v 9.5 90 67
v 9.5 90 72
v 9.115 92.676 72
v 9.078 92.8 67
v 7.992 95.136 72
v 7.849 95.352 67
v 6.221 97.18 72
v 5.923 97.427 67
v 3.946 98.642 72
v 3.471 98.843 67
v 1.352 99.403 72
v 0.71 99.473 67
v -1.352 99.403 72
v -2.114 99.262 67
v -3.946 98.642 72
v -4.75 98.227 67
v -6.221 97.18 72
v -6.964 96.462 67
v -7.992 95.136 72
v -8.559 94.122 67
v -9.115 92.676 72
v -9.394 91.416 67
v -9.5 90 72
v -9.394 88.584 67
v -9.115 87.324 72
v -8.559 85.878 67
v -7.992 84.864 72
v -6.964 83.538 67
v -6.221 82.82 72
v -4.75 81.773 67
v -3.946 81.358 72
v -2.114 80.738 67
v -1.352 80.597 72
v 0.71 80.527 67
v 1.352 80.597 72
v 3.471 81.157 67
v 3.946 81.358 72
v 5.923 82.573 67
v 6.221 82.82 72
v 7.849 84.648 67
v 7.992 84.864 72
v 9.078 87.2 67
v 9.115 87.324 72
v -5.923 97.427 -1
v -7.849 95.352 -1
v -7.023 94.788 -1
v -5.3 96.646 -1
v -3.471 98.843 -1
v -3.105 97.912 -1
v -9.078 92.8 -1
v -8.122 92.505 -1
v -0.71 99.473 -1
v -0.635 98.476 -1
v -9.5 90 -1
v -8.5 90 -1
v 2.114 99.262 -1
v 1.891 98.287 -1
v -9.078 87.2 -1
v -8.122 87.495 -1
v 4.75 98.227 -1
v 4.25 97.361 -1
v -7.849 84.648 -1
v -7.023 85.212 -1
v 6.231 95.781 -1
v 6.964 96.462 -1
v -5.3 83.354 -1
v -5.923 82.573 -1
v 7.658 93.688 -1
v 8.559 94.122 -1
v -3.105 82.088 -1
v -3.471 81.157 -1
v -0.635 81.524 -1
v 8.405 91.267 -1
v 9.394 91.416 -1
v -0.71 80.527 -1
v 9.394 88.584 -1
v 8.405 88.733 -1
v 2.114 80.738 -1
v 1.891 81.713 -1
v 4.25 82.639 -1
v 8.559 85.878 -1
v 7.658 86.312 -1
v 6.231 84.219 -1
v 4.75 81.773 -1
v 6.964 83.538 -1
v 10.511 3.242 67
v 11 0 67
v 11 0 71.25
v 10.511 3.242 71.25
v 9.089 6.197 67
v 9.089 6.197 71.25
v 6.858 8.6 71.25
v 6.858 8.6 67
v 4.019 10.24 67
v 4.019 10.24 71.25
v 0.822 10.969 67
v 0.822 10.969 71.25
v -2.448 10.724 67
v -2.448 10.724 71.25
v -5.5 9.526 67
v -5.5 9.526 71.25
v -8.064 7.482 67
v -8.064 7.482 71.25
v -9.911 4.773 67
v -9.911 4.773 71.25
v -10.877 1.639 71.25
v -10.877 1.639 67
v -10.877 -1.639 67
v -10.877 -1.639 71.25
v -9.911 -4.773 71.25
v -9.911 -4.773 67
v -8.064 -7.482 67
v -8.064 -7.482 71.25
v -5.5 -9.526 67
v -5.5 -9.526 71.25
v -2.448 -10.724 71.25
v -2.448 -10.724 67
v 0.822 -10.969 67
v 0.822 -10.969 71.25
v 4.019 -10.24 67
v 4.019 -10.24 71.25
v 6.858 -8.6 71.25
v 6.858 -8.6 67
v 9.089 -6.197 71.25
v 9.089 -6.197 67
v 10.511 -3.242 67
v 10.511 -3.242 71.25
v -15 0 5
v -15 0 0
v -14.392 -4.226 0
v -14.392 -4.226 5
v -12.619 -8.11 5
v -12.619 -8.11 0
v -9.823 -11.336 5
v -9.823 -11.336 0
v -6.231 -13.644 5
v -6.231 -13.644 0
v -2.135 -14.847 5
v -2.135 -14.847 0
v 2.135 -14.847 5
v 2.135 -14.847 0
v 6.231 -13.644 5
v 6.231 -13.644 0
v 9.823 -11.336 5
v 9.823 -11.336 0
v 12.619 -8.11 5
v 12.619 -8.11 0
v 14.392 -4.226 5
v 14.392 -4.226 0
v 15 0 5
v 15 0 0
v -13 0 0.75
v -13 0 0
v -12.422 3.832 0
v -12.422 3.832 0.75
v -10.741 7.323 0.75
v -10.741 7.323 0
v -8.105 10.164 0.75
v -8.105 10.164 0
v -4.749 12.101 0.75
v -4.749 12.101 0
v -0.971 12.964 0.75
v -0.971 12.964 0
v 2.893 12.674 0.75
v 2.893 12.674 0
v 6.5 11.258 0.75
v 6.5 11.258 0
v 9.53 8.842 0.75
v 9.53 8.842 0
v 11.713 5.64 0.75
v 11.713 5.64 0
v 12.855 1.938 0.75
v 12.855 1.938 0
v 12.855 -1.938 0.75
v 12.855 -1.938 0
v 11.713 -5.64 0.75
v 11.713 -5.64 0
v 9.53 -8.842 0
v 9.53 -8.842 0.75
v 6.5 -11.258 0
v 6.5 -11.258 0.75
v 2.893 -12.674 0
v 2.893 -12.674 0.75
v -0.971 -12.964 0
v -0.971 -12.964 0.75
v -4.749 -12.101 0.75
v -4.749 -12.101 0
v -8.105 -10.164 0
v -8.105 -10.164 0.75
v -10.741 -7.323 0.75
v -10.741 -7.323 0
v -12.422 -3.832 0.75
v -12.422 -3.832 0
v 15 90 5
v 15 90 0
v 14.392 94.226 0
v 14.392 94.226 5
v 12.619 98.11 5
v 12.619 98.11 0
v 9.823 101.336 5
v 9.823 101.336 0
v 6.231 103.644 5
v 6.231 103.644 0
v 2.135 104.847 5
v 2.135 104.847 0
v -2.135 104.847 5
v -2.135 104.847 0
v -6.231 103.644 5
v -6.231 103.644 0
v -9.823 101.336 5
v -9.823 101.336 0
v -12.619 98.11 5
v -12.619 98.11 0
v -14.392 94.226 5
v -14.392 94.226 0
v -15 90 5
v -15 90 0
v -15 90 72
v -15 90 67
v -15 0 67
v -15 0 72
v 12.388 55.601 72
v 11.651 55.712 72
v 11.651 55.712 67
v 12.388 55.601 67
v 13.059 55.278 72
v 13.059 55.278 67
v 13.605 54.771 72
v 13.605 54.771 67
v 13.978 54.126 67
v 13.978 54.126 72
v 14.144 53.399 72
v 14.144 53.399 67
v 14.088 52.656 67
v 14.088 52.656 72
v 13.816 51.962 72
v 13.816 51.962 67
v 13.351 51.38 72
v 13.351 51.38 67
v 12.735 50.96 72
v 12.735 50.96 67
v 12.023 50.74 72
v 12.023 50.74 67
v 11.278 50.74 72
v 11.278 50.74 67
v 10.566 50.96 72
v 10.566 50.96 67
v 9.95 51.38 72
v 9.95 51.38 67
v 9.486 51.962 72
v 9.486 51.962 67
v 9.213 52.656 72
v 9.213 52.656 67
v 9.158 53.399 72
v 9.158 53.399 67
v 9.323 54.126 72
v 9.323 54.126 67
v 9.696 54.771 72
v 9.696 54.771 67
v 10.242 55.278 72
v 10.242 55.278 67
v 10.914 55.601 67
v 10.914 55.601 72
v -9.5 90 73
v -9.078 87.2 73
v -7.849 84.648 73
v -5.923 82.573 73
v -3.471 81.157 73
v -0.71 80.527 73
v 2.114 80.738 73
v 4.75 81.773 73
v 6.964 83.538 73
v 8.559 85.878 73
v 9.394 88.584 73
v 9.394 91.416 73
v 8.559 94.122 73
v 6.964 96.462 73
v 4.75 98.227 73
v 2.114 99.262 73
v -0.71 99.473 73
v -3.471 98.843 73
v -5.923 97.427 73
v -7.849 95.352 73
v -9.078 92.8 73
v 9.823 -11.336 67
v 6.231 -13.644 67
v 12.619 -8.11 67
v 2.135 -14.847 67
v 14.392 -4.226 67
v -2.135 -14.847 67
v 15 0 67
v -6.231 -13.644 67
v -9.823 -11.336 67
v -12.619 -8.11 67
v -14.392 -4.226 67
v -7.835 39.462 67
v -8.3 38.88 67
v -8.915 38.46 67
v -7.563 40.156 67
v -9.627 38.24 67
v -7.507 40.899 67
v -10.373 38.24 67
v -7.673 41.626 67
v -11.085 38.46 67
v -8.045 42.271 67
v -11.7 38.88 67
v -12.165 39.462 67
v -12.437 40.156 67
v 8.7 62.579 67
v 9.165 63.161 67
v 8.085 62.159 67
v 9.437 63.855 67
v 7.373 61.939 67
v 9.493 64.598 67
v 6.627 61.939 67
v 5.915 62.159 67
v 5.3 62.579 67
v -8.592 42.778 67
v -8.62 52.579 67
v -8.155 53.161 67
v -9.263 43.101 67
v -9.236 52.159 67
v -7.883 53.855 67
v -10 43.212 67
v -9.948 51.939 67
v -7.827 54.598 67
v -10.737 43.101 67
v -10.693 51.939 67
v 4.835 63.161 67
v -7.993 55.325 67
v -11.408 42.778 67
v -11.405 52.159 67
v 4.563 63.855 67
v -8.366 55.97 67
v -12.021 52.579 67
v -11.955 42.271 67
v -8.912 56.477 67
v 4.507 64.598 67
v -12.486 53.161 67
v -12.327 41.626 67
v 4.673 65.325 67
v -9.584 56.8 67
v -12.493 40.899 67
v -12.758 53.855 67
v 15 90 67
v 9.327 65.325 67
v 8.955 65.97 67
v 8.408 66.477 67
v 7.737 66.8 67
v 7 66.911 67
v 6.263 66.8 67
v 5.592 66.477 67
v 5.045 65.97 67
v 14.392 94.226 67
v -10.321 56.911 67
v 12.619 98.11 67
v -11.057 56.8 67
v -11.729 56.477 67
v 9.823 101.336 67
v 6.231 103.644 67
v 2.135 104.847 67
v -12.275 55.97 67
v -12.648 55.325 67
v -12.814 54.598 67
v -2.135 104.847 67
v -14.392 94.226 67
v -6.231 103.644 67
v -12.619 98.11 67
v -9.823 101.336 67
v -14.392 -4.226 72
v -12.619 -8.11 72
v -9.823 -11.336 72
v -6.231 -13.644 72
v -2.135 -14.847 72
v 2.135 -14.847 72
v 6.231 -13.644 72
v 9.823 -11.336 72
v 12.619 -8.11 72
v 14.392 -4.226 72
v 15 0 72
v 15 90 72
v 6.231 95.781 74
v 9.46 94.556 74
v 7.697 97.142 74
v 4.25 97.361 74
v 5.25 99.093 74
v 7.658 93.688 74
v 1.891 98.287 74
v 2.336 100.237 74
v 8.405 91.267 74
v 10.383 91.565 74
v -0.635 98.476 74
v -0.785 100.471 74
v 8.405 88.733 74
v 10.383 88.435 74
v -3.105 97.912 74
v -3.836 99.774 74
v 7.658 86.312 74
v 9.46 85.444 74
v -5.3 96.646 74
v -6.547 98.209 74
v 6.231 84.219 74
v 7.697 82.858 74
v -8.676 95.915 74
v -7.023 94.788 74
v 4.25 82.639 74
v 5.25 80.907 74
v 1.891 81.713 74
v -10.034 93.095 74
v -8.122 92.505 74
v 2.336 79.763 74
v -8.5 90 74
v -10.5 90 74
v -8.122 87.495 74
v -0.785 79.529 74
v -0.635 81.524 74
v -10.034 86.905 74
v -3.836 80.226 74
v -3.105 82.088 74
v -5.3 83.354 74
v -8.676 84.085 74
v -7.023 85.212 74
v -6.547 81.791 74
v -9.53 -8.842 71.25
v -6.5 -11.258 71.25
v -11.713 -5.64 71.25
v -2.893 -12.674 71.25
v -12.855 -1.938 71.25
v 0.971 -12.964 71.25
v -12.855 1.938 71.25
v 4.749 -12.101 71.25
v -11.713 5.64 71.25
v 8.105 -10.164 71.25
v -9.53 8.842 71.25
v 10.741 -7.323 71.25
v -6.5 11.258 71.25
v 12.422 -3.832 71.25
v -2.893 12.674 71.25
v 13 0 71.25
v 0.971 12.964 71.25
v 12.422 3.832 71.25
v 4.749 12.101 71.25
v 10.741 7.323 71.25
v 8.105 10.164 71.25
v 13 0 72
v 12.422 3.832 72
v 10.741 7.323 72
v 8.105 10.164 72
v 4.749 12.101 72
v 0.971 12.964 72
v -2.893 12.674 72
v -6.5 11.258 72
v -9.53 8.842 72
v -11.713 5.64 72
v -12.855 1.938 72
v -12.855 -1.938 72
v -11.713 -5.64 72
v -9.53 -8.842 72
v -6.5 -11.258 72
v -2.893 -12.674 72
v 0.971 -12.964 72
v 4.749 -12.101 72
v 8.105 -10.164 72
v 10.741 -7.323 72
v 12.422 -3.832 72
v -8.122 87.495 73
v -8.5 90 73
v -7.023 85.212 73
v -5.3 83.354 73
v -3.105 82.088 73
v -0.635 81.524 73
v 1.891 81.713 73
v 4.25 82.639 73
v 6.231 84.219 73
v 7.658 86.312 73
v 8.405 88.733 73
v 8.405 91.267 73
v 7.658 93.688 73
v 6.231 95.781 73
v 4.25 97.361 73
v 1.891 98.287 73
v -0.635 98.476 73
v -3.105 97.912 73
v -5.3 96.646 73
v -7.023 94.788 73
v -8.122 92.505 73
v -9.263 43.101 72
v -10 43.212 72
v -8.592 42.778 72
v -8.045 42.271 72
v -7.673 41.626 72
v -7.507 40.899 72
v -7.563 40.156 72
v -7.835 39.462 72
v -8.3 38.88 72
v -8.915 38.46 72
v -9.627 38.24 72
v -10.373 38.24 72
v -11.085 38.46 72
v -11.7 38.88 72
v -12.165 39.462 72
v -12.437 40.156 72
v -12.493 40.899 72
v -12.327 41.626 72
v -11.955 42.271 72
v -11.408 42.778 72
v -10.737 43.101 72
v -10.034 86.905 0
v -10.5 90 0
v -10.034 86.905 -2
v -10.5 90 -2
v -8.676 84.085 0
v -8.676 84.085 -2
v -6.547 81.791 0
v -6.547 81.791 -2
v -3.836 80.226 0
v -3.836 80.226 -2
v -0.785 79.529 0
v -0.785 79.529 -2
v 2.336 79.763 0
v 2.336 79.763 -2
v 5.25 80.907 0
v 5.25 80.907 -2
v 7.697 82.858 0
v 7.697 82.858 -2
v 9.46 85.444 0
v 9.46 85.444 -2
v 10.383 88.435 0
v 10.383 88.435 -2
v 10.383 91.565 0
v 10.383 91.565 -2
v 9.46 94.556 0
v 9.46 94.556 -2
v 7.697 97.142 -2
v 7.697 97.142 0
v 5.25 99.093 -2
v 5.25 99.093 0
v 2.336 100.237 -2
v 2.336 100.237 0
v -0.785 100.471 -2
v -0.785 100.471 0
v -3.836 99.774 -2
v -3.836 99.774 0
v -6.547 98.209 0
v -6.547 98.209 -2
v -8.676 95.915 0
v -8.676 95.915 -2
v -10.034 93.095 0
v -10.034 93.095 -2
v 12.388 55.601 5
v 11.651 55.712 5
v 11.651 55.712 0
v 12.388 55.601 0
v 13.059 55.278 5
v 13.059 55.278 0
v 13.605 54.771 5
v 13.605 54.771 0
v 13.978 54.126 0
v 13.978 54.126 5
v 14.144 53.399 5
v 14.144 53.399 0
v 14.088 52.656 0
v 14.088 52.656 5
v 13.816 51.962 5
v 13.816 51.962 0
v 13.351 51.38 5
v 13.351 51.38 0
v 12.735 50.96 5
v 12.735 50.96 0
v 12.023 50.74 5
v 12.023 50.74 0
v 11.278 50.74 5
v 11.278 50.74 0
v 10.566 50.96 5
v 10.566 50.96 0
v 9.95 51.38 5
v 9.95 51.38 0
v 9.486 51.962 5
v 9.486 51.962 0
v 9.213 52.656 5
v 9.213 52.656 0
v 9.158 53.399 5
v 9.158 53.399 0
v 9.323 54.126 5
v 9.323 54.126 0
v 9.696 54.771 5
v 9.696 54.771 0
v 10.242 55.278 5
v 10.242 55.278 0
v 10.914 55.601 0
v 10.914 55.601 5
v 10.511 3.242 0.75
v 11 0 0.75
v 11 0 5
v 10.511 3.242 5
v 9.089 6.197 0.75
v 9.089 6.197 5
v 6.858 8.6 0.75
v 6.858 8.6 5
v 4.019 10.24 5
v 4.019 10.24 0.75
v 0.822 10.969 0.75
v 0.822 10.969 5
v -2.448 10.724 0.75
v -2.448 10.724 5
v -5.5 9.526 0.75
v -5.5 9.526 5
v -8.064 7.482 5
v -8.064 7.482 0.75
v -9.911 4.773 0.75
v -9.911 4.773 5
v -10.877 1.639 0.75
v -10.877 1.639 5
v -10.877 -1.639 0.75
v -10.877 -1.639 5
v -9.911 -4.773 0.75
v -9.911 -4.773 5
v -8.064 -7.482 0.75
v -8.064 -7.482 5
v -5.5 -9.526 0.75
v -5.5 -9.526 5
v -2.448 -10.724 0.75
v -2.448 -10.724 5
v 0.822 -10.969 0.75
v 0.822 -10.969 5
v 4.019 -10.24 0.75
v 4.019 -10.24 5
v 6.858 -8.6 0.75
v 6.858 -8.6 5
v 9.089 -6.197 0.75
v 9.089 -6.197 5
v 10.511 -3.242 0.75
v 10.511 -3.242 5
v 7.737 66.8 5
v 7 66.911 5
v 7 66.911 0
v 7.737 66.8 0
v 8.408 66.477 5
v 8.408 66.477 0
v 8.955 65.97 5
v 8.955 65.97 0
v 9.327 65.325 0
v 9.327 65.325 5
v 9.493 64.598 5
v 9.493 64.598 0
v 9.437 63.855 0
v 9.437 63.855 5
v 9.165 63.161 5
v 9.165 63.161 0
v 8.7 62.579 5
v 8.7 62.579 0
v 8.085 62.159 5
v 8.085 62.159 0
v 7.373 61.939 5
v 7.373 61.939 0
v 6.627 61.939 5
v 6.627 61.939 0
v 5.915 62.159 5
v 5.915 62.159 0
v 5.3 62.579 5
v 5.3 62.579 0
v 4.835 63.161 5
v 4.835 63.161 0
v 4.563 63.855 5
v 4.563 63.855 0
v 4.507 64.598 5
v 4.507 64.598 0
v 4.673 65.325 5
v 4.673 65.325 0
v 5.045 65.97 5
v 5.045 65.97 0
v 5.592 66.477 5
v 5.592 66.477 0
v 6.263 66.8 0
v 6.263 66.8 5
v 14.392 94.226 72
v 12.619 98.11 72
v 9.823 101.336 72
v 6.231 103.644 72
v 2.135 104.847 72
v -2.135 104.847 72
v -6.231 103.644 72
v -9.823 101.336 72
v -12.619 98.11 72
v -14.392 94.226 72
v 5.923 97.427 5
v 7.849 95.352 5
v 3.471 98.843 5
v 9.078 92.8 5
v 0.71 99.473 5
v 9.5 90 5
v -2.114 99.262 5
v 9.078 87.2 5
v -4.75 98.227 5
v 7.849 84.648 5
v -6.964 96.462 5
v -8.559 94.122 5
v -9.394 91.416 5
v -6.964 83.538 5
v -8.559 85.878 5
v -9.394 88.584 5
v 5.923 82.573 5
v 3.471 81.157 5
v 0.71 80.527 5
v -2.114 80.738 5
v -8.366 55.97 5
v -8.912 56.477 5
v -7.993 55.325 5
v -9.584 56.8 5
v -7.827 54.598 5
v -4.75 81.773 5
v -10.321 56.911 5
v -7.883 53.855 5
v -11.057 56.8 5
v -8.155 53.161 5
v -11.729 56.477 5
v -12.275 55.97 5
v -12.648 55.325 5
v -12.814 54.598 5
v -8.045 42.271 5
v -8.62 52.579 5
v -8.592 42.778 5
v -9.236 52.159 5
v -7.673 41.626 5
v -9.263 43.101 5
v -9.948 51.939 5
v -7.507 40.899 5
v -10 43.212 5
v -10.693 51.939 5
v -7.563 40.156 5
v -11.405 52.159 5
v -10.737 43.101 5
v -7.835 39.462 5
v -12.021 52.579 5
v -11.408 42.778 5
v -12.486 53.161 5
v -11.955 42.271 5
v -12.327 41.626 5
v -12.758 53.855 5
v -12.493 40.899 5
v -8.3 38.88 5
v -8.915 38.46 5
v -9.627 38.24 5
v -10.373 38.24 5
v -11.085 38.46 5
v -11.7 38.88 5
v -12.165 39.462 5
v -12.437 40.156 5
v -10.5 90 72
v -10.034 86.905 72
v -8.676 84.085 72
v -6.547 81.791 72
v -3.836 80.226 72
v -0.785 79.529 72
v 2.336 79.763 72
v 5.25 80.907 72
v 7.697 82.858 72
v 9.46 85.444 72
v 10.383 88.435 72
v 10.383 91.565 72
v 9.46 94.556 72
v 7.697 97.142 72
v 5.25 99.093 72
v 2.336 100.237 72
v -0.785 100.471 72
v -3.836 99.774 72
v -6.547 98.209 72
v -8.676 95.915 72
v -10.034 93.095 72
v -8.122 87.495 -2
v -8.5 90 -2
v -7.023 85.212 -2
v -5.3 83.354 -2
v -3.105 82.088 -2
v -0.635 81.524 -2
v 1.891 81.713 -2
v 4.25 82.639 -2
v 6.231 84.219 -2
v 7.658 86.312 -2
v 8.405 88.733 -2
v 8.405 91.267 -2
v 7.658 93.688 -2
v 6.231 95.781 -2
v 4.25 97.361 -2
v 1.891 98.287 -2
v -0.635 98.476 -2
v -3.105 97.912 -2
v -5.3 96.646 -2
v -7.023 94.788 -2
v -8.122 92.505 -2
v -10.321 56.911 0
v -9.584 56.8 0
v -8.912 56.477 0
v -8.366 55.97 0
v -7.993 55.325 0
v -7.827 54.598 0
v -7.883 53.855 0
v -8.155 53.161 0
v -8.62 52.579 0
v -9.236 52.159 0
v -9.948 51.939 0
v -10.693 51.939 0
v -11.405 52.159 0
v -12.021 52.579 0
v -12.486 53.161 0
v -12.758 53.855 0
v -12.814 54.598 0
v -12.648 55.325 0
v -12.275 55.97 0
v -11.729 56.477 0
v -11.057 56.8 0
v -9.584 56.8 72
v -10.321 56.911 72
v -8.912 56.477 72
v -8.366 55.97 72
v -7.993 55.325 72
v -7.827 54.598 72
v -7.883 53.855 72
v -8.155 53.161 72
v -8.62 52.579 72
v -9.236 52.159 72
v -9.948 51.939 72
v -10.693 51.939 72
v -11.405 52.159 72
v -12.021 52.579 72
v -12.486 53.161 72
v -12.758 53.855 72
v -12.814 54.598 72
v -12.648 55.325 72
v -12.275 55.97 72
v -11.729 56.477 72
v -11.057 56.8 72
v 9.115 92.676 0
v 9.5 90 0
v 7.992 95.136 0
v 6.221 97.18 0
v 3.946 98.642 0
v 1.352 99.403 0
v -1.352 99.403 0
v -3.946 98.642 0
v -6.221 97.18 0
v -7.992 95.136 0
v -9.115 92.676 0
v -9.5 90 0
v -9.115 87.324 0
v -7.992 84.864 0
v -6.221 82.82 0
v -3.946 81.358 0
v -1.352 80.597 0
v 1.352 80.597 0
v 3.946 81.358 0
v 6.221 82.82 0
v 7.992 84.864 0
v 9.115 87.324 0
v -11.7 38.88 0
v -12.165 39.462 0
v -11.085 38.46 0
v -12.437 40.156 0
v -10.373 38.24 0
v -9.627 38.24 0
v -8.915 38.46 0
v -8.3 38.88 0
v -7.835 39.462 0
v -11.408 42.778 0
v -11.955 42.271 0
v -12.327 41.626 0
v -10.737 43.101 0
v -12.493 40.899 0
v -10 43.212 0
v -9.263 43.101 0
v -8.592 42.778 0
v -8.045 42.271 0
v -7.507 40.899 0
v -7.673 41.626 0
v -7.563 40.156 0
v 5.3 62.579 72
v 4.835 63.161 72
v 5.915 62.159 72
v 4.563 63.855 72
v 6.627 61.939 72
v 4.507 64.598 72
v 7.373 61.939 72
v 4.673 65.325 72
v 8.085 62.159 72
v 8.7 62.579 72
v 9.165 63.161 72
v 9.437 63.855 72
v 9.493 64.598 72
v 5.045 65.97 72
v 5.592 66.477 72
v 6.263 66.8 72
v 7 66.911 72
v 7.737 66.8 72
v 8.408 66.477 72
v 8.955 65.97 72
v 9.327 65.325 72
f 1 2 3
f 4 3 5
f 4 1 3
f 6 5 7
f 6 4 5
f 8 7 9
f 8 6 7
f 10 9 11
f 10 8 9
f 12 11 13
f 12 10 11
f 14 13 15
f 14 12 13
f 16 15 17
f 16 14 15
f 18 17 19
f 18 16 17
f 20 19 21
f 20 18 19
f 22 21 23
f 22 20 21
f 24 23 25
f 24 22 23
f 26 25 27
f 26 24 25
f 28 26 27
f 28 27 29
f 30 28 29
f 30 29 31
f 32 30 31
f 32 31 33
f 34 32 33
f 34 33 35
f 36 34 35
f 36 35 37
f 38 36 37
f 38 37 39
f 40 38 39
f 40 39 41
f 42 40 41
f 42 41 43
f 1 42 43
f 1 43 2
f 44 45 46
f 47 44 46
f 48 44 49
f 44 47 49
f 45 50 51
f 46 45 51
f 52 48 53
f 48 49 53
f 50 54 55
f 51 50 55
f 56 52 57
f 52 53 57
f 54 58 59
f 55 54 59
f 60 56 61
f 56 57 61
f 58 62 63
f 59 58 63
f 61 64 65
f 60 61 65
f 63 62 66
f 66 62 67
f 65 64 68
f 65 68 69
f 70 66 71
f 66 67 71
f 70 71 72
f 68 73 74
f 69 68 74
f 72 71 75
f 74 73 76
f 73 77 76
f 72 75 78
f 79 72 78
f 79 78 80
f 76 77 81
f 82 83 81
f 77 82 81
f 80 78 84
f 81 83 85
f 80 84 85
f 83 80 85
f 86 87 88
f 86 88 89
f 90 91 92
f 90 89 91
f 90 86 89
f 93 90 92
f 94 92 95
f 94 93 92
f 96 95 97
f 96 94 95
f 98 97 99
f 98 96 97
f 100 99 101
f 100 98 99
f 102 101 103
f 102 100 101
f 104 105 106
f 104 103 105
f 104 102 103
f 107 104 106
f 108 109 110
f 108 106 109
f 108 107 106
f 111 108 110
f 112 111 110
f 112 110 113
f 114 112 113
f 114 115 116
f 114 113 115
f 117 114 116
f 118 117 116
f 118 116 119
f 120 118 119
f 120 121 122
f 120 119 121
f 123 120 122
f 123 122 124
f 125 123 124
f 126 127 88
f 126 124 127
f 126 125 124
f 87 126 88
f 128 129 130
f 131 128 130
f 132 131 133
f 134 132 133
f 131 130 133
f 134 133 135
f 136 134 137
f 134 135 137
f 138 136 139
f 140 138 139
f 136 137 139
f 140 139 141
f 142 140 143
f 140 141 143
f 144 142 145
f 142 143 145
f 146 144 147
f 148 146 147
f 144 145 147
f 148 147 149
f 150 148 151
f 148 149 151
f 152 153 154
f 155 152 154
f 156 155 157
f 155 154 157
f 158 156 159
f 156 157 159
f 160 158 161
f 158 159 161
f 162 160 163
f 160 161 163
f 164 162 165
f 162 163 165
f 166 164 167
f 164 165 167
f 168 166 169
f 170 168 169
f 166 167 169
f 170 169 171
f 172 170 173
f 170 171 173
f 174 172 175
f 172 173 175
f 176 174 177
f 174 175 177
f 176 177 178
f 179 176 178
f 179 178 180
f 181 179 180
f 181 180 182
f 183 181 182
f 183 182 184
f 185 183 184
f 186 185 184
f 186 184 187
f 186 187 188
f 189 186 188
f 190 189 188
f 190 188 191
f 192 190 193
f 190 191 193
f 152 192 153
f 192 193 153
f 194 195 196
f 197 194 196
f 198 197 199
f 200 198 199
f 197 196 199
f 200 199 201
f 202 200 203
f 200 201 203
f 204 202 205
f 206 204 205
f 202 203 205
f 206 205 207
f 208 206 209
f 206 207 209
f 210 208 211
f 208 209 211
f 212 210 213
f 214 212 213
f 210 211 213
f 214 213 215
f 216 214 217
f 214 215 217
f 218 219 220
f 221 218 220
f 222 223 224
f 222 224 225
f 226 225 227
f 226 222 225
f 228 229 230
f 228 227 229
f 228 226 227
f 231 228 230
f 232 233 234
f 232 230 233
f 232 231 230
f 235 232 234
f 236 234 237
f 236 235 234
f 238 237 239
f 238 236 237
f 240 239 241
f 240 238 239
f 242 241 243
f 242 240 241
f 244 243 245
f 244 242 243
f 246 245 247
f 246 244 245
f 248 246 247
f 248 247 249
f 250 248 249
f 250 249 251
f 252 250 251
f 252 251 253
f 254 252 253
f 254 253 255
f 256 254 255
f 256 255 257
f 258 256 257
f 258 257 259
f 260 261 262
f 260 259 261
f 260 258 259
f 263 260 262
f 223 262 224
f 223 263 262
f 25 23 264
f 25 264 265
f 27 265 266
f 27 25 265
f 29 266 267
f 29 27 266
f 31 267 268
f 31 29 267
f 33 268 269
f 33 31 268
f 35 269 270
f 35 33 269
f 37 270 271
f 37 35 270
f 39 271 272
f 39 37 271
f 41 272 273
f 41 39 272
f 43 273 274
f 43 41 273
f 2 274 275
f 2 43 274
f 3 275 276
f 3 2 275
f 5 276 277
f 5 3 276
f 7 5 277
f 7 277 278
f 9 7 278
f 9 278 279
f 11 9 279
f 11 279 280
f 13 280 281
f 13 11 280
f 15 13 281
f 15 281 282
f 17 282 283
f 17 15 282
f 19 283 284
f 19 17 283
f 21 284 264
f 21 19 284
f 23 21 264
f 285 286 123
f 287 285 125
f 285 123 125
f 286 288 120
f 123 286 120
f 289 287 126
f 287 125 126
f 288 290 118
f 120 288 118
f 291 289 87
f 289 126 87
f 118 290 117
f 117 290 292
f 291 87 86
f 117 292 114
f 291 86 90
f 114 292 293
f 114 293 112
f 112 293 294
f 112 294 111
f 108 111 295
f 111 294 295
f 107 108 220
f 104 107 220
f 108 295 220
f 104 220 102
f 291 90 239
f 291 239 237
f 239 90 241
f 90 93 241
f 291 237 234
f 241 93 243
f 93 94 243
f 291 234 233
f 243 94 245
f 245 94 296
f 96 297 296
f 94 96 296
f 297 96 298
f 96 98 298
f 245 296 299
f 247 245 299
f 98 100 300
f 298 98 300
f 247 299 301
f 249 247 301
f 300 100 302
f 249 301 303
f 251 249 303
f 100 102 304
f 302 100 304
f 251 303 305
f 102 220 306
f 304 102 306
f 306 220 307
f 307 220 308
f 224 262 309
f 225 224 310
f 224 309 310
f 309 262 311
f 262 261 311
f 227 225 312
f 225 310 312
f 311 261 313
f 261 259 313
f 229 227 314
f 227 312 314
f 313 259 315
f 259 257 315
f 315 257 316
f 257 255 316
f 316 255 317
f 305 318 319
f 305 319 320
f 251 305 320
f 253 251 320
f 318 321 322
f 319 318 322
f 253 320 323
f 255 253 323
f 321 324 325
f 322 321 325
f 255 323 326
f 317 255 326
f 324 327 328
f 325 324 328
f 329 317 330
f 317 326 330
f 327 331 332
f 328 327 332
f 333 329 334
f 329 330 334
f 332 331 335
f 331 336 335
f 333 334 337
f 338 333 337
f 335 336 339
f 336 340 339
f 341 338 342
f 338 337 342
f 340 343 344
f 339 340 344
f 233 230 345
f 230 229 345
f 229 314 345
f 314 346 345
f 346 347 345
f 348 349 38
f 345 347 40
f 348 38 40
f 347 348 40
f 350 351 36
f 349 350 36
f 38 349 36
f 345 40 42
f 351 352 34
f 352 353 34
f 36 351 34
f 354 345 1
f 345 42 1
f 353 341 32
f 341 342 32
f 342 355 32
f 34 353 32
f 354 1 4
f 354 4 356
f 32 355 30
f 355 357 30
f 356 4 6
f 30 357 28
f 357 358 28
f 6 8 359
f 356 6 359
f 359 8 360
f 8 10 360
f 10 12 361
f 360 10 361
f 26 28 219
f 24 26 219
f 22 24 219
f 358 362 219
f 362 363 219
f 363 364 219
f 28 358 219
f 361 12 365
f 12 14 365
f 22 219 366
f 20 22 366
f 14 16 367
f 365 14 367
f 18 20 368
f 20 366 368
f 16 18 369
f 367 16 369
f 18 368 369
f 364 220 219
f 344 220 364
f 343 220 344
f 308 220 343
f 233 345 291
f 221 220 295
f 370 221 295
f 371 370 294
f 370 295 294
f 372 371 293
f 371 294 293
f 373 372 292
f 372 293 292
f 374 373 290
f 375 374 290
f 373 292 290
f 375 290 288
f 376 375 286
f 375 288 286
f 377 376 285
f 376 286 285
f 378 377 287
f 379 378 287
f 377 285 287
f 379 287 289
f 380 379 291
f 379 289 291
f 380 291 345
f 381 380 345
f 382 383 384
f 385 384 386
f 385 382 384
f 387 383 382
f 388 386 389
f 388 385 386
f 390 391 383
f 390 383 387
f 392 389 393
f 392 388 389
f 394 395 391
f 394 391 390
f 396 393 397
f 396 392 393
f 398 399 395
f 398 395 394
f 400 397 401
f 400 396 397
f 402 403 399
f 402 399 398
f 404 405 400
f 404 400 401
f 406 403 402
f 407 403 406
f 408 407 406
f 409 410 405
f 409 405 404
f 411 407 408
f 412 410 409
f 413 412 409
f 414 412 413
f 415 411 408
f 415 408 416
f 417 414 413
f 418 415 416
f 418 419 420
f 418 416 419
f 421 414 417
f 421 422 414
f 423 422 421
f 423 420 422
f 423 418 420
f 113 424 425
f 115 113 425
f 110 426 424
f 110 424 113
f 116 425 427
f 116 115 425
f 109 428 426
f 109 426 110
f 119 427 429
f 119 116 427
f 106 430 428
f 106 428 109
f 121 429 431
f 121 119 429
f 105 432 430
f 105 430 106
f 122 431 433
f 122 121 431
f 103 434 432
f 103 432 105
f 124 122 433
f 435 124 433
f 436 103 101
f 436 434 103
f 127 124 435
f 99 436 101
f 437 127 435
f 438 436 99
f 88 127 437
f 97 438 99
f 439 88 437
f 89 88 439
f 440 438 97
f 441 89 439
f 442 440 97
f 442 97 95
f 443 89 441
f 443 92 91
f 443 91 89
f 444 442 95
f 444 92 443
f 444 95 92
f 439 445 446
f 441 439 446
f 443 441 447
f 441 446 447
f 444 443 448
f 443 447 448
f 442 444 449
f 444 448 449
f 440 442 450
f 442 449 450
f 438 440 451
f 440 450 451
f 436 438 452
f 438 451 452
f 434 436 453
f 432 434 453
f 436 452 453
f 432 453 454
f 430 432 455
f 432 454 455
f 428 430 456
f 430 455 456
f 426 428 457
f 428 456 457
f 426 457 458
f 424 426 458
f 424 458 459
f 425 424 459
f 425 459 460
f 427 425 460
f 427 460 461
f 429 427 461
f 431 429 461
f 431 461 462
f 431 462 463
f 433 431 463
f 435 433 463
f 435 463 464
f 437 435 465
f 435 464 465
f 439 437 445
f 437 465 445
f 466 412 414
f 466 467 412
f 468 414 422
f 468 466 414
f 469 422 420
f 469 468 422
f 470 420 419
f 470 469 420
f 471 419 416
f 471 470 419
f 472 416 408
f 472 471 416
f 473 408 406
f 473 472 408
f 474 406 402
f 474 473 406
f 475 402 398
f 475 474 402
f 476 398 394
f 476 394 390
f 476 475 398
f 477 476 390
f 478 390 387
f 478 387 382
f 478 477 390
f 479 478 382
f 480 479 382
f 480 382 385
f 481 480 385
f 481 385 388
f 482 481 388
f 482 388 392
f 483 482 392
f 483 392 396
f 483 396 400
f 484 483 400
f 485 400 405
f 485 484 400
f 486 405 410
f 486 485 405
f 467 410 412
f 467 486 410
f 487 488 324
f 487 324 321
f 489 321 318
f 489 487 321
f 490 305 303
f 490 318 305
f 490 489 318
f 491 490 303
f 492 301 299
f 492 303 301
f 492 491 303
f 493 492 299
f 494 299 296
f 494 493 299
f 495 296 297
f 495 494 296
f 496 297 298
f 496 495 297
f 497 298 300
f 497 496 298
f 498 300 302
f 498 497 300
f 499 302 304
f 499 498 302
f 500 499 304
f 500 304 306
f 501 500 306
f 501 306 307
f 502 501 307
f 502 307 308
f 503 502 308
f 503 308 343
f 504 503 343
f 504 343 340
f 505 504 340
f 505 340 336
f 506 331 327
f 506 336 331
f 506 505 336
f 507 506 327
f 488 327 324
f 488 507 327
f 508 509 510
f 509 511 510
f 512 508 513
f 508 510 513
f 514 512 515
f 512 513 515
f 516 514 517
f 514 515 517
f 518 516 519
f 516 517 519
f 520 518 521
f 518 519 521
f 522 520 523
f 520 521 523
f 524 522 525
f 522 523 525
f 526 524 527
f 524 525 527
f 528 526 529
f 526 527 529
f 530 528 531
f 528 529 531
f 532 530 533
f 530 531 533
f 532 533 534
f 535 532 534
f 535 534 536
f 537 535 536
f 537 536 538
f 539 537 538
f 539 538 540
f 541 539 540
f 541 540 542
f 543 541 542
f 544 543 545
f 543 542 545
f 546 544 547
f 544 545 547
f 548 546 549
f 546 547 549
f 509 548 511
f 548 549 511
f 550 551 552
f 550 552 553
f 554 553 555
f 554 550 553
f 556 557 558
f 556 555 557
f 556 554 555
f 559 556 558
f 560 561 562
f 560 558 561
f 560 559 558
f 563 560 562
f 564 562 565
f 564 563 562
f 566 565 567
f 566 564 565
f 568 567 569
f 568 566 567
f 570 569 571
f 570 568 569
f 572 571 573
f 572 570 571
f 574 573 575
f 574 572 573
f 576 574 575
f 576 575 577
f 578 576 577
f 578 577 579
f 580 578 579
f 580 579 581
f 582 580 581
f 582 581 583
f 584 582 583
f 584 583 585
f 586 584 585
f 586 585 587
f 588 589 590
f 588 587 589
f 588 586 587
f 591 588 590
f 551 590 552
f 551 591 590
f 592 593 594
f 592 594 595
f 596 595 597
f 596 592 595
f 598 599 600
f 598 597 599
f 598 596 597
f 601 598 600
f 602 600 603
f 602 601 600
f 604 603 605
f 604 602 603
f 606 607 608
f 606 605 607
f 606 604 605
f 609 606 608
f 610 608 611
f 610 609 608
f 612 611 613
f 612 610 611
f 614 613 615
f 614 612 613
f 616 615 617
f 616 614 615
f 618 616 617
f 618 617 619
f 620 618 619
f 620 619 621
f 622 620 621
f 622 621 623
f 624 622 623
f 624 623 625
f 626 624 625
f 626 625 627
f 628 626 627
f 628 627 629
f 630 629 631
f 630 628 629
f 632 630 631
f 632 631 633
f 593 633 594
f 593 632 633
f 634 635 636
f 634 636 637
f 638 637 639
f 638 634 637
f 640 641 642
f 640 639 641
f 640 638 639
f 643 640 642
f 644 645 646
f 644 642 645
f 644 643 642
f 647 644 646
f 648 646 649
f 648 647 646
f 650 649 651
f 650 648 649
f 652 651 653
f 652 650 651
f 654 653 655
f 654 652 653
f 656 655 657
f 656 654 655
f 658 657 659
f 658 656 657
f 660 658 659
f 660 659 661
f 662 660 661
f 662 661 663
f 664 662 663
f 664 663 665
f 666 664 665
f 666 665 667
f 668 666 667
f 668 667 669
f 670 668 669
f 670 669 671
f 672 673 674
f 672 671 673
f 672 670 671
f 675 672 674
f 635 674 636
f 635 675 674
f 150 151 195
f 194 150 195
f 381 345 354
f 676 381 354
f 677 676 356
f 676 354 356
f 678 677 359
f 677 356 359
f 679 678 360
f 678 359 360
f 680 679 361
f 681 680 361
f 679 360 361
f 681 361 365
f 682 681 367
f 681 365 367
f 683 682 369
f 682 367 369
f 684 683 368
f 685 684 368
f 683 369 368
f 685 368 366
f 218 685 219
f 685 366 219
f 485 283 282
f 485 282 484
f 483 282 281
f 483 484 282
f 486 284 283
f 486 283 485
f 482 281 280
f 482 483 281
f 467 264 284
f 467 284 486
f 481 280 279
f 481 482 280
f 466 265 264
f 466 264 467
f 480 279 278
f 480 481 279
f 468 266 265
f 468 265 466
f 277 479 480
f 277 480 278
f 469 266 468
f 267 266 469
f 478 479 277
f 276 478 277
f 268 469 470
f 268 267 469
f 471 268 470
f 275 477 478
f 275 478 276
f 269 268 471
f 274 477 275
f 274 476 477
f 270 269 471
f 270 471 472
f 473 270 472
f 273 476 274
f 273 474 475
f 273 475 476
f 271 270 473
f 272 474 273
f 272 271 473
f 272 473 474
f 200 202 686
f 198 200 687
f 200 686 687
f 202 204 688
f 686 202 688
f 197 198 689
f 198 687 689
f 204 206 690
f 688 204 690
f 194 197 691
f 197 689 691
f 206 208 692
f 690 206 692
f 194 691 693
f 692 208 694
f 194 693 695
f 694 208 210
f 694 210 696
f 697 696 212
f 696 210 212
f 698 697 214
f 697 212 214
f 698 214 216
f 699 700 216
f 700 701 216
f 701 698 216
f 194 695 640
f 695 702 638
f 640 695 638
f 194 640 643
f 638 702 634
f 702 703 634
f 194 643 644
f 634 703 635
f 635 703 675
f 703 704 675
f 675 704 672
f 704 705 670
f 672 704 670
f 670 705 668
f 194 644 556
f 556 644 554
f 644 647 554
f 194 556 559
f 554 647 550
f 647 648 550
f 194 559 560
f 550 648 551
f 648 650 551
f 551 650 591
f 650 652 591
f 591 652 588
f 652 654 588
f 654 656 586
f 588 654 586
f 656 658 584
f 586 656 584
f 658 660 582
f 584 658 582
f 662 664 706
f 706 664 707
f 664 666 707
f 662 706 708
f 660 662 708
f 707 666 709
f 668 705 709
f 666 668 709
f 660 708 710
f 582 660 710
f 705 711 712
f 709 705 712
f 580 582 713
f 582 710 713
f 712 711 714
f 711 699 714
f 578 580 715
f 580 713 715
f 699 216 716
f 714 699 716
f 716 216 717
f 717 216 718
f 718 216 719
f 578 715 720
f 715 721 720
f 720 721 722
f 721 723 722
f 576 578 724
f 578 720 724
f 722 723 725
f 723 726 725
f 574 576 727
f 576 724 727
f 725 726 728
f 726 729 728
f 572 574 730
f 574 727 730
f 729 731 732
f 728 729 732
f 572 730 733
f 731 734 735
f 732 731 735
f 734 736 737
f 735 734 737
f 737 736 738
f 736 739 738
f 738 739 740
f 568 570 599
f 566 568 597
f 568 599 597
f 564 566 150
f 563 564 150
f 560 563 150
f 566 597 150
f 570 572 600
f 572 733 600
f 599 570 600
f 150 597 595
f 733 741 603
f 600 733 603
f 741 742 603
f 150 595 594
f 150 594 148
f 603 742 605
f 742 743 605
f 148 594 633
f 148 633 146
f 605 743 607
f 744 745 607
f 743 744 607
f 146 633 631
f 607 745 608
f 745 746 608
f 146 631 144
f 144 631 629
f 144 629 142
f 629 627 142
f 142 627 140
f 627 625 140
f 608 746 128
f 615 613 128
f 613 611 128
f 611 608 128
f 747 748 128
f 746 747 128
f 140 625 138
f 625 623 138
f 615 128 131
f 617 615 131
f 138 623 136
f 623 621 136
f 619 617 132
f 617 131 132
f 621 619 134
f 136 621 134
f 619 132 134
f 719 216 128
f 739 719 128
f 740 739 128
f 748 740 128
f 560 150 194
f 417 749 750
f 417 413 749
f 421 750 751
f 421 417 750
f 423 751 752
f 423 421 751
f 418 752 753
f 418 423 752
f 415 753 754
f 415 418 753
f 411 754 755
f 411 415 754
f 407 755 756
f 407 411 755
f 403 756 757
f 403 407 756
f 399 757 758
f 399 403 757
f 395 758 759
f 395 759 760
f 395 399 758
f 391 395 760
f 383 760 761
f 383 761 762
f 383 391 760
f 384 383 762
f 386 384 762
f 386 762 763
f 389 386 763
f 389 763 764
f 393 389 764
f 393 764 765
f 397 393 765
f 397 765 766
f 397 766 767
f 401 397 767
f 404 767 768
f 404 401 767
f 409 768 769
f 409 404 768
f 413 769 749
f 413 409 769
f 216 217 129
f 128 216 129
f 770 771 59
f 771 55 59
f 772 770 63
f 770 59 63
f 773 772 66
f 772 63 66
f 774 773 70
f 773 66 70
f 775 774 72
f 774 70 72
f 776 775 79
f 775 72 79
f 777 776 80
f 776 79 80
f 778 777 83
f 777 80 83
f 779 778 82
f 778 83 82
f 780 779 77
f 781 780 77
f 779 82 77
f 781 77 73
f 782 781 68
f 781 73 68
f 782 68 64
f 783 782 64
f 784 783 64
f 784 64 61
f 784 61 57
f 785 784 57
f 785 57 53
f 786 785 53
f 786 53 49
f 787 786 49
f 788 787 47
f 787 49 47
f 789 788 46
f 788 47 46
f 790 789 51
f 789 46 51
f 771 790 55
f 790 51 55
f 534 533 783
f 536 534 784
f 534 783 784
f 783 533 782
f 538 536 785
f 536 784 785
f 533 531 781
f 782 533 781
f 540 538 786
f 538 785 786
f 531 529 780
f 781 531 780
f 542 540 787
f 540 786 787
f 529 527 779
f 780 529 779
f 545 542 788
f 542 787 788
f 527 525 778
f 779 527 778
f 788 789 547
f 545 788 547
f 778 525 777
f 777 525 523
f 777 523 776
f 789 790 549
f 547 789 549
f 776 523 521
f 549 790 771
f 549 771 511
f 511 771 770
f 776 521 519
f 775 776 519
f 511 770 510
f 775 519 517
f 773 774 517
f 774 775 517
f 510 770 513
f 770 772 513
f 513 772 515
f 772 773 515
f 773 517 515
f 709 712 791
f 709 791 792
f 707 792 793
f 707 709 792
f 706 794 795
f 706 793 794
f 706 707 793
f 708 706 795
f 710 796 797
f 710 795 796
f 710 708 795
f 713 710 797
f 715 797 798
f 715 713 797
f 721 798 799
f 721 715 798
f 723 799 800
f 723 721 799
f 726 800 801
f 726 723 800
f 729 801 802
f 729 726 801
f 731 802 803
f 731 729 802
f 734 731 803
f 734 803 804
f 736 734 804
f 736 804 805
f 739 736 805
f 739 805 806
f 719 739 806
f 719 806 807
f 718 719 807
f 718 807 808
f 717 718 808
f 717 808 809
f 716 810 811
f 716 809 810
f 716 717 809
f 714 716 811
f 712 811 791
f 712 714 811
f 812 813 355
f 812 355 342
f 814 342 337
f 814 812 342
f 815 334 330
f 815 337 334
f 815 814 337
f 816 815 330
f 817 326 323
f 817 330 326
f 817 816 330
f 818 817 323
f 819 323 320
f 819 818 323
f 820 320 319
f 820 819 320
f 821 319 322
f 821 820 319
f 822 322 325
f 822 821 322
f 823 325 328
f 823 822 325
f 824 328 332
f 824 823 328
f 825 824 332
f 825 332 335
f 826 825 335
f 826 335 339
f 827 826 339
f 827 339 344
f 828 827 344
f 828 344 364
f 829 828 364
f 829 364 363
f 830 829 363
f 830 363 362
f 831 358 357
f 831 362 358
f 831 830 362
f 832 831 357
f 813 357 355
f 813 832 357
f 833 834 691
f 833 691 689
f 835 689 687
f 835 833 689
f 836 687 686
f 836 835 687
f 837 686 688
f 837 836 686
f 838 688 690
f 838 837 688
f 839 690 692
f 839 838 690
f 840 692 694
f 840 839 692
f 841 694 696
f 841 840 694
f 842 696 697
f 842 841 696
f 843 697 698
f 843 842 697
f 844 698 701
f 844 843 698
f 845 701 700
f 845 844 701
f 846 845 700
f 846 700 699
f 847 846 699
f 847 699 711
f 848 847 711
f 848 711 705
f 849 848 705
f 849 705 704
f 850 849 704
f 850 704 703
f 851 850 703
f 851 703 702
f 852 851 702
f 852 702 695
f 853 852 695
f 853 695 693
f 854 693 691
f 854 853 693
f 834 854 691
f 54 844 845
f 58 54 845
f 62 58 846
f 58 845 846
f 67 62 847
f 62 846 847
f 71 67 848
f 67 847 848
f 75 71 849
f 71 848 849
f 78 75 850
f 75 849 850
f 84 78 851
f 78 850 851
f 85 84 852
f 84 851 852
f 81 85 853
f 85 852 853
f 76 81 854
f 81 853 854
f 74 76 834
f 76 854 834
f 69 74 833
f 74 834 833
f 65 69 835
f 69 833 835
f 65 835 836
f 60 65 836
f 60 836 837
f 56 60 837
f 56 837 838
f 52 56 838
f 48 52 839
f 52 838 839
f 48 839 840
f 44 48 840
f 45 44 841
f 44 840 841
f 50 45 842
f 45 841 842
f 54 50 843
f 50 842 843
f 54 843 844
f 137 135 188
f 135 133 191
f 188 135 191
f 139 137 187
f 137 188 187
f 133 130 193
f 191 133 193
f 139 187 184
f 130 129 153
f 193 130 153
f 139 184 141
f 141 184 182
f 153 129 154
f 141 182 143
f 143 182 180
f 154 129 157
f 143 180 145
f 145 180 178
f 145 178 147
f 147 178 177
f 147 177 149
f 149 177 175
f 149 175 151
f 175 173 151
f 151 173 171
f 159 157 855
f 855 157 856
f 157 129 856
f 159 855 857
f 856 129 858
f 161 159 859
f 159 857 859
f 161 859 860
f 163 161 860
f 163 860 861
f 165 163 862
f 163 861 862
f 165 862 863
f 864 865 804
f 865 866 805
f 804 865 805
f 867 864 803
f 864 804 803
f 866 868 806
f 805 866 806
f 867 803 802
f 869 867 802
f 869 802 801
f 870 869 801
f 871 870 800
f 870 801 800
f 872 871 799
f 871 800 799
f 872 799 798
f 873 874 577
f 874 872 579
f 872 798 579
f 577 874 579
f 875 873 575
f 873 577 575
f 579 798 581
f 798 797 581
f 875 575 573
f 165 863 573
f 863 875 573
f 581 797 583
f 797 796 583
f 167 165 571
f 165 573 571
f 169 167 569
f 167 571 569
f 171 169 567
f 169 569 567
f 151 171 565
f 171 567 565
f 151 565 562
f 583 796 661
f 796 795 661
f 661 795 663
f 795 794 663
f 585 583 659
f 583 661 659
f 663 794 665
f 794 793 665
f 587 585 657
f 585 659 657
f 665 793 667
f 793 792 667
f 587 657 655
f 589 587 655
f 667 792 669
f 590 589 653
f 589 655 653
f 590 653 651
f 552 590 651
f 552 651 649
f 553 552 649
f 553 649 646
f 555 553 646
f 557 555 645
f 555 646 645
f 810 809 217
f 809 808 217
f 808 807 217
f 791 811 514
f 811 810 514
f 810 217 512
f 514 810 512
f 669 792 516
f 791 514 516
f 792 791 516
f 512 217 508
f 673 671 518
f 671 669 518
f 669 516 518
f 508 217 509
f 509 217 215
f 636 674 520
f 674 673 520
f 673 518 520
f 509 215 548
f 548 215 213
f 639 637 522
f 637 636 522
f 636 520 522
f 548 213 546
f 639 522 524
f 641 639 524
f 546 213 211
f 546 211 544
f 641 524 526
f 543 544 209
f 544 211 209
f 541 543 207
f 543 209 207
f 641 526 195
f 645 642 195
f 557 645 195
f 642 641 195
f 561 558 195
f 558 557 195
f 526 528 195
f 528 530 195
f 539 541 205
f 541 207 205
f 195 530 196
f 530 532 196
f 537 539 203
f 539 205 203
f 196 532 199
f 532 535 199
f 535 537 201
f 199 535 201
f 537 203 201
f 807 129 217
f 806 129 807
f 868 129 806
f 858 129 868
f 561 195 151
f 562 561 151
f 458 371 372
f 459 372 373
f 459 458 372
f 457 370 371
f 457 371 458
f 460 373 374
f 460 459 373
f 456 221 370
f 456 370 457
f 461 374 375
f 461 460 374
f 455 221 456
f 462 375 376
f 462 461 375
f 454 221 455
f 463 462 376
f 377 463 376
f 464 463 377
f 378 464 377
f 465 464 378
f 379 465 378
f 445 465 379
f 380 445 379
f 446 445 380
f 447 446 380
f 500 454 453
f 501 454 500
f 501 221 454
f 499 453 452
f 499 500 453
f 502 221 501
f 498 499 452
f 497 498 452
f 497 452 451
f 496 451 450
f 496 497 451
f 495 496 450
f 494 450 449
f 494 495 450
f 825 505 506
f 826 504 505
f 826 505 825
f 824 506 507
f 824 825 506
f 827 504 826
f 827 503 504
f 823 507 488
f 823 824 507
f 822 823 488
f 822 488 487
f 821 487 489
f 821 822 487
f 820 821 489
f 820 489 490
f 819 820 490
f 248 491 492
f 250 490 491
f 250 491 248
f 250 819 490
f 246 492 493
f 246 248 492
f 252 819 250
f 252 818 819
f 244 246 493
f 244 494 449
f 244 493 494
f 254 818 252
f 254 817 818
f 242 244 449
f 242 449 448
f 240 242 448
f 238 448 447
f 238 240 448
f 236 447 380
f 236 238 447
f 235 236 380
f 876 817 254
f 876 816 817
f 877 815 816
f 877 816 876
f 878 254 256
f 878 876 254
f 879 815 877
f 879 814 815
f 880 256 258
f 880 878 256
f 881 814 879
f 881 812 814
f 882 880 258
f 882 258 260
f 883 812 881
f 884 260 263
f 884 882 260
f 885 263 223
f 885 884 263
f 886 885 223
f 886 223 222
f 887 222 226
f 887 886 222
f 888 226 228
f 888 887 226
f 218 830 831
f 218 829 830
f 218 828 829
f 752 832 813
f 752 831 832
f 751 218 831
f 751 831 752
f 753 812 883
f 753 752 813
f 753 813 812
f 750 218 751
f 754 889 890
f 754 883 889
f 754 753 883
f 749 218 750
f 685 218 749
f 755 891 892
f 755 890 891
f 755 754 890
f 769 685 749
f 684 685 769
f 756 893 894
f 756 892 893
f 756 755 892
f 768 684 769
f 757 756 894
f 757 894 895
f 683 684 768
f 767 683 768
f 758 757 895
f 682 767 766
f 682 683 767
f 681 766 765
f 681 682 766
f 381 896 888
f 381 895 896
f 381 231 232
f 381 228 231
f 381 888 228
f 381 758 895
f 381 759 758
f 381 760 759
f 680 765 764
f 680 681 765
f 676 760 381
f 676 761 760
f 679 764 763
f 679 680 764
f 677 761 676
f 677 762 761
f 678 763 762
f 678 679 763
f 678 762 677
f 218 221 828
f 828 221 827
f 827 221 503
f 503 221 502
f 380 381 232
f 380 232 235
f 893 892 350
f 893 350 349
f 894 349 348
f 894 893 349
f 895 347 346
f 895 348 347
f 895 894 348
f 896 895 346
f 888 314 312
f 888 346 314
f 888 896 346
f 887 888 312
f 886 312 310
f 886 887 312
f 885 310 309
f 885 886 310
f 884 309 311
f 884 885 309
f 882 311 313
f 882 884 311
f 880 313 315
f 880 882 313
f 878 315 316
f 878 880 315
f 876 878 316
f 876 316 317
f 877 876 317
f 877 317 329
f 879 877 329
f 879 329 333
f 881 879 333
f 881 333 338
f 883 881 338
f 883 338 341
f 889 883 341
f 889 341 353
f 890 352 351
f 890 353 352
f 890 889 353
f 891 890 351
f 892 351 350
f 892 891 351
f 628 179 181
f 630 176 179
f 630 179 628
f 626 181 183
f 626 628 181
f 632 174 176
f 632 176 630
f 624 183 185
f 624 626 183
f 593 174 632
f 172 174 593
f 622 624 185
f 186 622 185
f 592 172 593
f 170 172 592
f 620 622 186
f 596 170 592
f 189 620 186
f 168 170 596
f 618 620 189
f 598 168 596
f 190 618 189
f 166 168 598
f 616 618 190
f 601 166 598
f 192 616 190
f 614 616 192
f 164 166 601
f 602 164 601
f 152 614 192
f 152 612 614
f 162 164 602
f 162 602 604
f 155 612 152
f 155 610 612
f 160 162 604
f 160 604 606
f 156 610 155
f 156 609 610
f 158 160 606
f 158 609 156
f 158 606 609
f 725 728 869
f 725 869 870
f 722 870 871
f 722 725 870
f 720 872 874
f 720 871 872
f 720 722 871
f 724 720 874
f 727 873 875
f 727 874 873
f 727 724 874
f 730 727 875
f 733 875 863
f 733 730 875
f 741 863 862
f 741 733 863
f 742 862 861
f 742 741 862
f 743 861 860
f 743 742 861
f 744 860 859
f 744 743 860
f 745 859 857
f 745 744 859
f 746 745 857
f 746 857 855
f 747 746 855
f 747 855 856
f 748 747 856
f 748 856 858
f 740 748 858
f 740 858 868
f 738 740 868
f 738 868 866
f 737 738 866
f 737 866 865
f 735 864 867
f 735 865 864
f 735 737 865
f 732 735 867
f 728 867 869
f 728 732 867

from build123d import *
from build123d.topology import SkipClean

# Parameters (mm, degrees)
SKETCH_1_R               = 11
SKETCH_1_R_2             = 9.5
EXTRUDE_1_DEPTH          = 72
SKETCH_2_W               = 62
SKETCH_2_H               = 70
SKETCH_2_H_2             = 67.94057246
CUT_EXTRUDE_1_DEPTH      = 70
EXTRUDE_2_DEPTH          = 62
EXTRUDE_3_DEPTH          = 62
CUT_EXTRUDE_3_DEPTH      = 130.811063026
CUT_EXTRUDE_3_DEPTH_BACK = 130.811063026
SKETCH_6_R               = 2.5
CUT_EXTRUDE_4_DEPTH      = 136.359998088
CUT_EXTRUDE_4_DEPTH_BACK = 136.359998088
SKETCH_7_W               = 62
SKETCH_7_H               = 120
SKETCH_8_R               = 13
CUT_EXTRUDE_5_DEPTH      = 0.75
SKETCH_9_R               = 13
CUT_EXTRUDE_6_DEPTH      = 0.75


with BuildPart() as part:
    # 草图1 → 凸台-拉伸1 (new body)
    with BuildSketch(Plane.XY):
        with BuildLine():
            Line((-15, 90), (-15, 0))
            ThreePointArc((-15, 0), (0, -15), (15, 0))
            Line((15, 0), (15, 90))
            ThreePointArc((15, 90), (0, 105), (-15, 90))
        make_face()
        Circle(SKETCH_1_R, mode=Mode.SUBTRACT)
        with Locations((0, 90)):
            Circle(SKETCH_1_R_2, mode=Mode.SUBTRACT)
    extrude(amount=EXTRUDE_1_DEPTH)

    # 草图2 → 切除-拉伸1 (cut)
    with BuildSketch(Plane.ZY.offset(15)):
        with Locations((36, 80)):
            Rectangle(SKETCH_2_W, SKETCH_2_H)
        with Locations((36, 11.02971377)):
            Rectangle(SKETCH_2_W, SKETCH_2_H_2)
    extrude(amount=-CUT_EXTRUDE_1_DEPTH, mode=Mode.SUBTRACT)


with BuildPart() as cut_extrude_1_piece_1:
    # of the separate pieces the step leaves, piece 1, a body of its own (cut_extrude_1_pieces)
    add(part.part.solids().sort_by_distance((15, 0, 0))[0])



with BuildPart() as cut_extrude_1_piece_2:
    # of the separate pieces the step leaves, piece 2, a body of its own (cut_extrude_1_pieces)
    add(part.part.solids().sort_by_distance((15, 0, 67))[0])


with BuildPart() as cut_extrude_1_piece_1_1:
    add(cut_extrude_1_piece_1.part)

    add(cut_extrude_1_piece_2.part)  # 凸台-拉伸2 merges 切除-拉伸1 piece 2
    # 草图4 → 凸台-拉伸2 (add)
    with BuildSketch(Plane(origin=(0, 0, 67), x_dir=(-1, 0, 0), z_dir=(0, 0, -1))):
        with BuildLine():
            Line((-4.490156776, 68.758657712), (15, 57.50601045))
            Line((15, 57.50601045), (36.319312502, 12.911360415))
            ThreePointArc((36.319312502, 12.911360415), (35.142094618, 9.577570071), (31.808304274, 10.754787955))
            Line((31.808304274, 10.754787955), (15, 45.913541163))
            Line((15, 45.913541163), (-9.509843224, 60.064305746))
            ThreePointArc((-9.509843224, 60.064305746), (-11.347175983, 66.921324953), (-4.490156776, 68.758657712))
        make_face()
    extrude(amount=EXTRUDE_2_DEPTH)

    # 草图5 → 凸台-拉伸3 (add)
    with BuildSketch(Plane(origin=(0, 0, 67), x_dir=(-1, 0, 0), z_dir=(0, 0, -1))):
        with BuildLine():
            Line((-30.017605928, 49.094069219), (-15, 60.919508718))
            Line((-15, 60.919508718), (12.5, 45.042376315))
            ThreePointArc((12.5, 45.042376315), (14.330127019, 38.212249296), (7.5, 36.382122277))
            Line((7.5, 36.382122277), (-15, 49.372503334))
            Line((-15, 49.372503334), (-27.615908762, 44.780688066))
            ThreePointArc((-27.615908762, 44.780688066), (-30.655195979, 45.913733224), (-30.017605928, 49.094069219))
        make_face()
    extrude(amount=EXTRUDE_3_DEPTH)

    # 草图6 → 切除-拉伸3 (cut, two sides: drawn at the far end of the back side and taken through both)
    with BuildSketch(Plane(origin=(0, 0, 67), x_dir=(-1, 0, 0), z_dir=(0, 0, -1)).offset(-CUT_EXTRUDE_3_DEPTH_BACK)):
        with Locations(Location((-7, 64.411481729, 0), (0, 0, 90))):
            Circle(SKETCH_6_R)
        with Locations(Location((-11.650635095, 53.212249296, 0), (0, 0, 90))):
            Circle(SKETCH_6_R)
        with Locations(Location((10, 40.712249296, 0), (0, 0, 90))):
            Circle(SKETCH_6_R)
        with Locations(Location((10.320508076, 54.411481729, 0), (0, 0, 90))):
            Circle(SKETCH_6_R)
    extrude(amount=CUT_EXTRUDE_3_DEPTH + CUT_EXTRUDE_3_DEPTH_BACK, mode=Mode.SUBTRACT)

    # 草图7 → 切除-拉伸4 (cut, two sides: drawn at the far end of the back side and taken through both)
    with BuildSketch(Plane.ZY.offset(15).offset(-CUT_EXTRUDE_4_DEPTH_BACK)):
        with Locations((36, 45)):
            Rectangle(SKETCH_7_W, SKETCH_7_H)
    extrude(amount=CUT_EXTRUDE_4_DEPTH + CUT_EXTRUDE_4_DEPTH_BACK, mode=Mode.SUBTRACT)


with BuildPart() as cut_extrude_4_piece_1:
    # of the separate pieces the step leaves, piece 1, a body of its own (cut_extrude_4_pieces)
    add(cut_extrude_1_piece_1_1.part.solids().sort_by_distance((-15, 90, 5))[0])

    # 草图9 → 切除-拉伸6 (cut)
    with BuildSketch(Plane(origin=(0, 0, 0), x_dir=(-1, 0, 0), z_dir=(0, 0, -1))):
        Circle(SKETCH_9_R)
    extrude(amount=-CUT_EXTRUDE_6_DEPTH, mode=Mode.SUBTRACT)



with BuildPart() as cut_extrude_4_piece_2:
    # of the separate pieces the step leaves, piece 2, a body of its own (cut_extrude_4_pieces)
    add(cut_extrude_1_piece_1_1.part.solids().sort_by_distance((15, 0, 67))[0])

    # 草图8 → 切除-拉伸5 (cut)
    with BuildSketch(Plane.XY.offset(72)):
        Circle(SKETCH_8_R)
    extrude(amount=-CUT_EXTRUDE_5_DEPTH, mode=Mode.SUBTRACT)


with BuildPart() as cut_extrude_4_piece_1_1:
    with SkipClean():  # the faces are left unmerged after this step: merging them gives an invalid solid
        add(cut_extrude_4_piece_1.part)

        add(cut_extrude_4_piece_2.part)  # 旋转1 merges 切除-拉伸4 piece 2
        # 草图10 → 旋转1 (revolve)
        with BuildSketch(Plane(origin=(0, 0, 0), x_dir=(0, 0, -1), z_dir=(1, 0, 0)), mode=Mode.PRIVATE) as revolve_1_sk:
            Polygon((0, 79.5), (2, 79.5), (2, 81.5), (1, 81.5), (1, 80.5), (0, 80.5), align=None)
            Polygon((-72, 79.5), (-74, 79.5), (-74, 81.5), (-73, 81.5), (-73, 80.5), (-72, 80.5), align=None)
        revolve(revolve_1_sk.sketch.rotate(Axis((0, 90, 67), (0, 0, 1)), 270), axis=Axis((0, 90, 67), (0, 0, 1)))


solid = cut_extrude_4_piece_1_1.part
